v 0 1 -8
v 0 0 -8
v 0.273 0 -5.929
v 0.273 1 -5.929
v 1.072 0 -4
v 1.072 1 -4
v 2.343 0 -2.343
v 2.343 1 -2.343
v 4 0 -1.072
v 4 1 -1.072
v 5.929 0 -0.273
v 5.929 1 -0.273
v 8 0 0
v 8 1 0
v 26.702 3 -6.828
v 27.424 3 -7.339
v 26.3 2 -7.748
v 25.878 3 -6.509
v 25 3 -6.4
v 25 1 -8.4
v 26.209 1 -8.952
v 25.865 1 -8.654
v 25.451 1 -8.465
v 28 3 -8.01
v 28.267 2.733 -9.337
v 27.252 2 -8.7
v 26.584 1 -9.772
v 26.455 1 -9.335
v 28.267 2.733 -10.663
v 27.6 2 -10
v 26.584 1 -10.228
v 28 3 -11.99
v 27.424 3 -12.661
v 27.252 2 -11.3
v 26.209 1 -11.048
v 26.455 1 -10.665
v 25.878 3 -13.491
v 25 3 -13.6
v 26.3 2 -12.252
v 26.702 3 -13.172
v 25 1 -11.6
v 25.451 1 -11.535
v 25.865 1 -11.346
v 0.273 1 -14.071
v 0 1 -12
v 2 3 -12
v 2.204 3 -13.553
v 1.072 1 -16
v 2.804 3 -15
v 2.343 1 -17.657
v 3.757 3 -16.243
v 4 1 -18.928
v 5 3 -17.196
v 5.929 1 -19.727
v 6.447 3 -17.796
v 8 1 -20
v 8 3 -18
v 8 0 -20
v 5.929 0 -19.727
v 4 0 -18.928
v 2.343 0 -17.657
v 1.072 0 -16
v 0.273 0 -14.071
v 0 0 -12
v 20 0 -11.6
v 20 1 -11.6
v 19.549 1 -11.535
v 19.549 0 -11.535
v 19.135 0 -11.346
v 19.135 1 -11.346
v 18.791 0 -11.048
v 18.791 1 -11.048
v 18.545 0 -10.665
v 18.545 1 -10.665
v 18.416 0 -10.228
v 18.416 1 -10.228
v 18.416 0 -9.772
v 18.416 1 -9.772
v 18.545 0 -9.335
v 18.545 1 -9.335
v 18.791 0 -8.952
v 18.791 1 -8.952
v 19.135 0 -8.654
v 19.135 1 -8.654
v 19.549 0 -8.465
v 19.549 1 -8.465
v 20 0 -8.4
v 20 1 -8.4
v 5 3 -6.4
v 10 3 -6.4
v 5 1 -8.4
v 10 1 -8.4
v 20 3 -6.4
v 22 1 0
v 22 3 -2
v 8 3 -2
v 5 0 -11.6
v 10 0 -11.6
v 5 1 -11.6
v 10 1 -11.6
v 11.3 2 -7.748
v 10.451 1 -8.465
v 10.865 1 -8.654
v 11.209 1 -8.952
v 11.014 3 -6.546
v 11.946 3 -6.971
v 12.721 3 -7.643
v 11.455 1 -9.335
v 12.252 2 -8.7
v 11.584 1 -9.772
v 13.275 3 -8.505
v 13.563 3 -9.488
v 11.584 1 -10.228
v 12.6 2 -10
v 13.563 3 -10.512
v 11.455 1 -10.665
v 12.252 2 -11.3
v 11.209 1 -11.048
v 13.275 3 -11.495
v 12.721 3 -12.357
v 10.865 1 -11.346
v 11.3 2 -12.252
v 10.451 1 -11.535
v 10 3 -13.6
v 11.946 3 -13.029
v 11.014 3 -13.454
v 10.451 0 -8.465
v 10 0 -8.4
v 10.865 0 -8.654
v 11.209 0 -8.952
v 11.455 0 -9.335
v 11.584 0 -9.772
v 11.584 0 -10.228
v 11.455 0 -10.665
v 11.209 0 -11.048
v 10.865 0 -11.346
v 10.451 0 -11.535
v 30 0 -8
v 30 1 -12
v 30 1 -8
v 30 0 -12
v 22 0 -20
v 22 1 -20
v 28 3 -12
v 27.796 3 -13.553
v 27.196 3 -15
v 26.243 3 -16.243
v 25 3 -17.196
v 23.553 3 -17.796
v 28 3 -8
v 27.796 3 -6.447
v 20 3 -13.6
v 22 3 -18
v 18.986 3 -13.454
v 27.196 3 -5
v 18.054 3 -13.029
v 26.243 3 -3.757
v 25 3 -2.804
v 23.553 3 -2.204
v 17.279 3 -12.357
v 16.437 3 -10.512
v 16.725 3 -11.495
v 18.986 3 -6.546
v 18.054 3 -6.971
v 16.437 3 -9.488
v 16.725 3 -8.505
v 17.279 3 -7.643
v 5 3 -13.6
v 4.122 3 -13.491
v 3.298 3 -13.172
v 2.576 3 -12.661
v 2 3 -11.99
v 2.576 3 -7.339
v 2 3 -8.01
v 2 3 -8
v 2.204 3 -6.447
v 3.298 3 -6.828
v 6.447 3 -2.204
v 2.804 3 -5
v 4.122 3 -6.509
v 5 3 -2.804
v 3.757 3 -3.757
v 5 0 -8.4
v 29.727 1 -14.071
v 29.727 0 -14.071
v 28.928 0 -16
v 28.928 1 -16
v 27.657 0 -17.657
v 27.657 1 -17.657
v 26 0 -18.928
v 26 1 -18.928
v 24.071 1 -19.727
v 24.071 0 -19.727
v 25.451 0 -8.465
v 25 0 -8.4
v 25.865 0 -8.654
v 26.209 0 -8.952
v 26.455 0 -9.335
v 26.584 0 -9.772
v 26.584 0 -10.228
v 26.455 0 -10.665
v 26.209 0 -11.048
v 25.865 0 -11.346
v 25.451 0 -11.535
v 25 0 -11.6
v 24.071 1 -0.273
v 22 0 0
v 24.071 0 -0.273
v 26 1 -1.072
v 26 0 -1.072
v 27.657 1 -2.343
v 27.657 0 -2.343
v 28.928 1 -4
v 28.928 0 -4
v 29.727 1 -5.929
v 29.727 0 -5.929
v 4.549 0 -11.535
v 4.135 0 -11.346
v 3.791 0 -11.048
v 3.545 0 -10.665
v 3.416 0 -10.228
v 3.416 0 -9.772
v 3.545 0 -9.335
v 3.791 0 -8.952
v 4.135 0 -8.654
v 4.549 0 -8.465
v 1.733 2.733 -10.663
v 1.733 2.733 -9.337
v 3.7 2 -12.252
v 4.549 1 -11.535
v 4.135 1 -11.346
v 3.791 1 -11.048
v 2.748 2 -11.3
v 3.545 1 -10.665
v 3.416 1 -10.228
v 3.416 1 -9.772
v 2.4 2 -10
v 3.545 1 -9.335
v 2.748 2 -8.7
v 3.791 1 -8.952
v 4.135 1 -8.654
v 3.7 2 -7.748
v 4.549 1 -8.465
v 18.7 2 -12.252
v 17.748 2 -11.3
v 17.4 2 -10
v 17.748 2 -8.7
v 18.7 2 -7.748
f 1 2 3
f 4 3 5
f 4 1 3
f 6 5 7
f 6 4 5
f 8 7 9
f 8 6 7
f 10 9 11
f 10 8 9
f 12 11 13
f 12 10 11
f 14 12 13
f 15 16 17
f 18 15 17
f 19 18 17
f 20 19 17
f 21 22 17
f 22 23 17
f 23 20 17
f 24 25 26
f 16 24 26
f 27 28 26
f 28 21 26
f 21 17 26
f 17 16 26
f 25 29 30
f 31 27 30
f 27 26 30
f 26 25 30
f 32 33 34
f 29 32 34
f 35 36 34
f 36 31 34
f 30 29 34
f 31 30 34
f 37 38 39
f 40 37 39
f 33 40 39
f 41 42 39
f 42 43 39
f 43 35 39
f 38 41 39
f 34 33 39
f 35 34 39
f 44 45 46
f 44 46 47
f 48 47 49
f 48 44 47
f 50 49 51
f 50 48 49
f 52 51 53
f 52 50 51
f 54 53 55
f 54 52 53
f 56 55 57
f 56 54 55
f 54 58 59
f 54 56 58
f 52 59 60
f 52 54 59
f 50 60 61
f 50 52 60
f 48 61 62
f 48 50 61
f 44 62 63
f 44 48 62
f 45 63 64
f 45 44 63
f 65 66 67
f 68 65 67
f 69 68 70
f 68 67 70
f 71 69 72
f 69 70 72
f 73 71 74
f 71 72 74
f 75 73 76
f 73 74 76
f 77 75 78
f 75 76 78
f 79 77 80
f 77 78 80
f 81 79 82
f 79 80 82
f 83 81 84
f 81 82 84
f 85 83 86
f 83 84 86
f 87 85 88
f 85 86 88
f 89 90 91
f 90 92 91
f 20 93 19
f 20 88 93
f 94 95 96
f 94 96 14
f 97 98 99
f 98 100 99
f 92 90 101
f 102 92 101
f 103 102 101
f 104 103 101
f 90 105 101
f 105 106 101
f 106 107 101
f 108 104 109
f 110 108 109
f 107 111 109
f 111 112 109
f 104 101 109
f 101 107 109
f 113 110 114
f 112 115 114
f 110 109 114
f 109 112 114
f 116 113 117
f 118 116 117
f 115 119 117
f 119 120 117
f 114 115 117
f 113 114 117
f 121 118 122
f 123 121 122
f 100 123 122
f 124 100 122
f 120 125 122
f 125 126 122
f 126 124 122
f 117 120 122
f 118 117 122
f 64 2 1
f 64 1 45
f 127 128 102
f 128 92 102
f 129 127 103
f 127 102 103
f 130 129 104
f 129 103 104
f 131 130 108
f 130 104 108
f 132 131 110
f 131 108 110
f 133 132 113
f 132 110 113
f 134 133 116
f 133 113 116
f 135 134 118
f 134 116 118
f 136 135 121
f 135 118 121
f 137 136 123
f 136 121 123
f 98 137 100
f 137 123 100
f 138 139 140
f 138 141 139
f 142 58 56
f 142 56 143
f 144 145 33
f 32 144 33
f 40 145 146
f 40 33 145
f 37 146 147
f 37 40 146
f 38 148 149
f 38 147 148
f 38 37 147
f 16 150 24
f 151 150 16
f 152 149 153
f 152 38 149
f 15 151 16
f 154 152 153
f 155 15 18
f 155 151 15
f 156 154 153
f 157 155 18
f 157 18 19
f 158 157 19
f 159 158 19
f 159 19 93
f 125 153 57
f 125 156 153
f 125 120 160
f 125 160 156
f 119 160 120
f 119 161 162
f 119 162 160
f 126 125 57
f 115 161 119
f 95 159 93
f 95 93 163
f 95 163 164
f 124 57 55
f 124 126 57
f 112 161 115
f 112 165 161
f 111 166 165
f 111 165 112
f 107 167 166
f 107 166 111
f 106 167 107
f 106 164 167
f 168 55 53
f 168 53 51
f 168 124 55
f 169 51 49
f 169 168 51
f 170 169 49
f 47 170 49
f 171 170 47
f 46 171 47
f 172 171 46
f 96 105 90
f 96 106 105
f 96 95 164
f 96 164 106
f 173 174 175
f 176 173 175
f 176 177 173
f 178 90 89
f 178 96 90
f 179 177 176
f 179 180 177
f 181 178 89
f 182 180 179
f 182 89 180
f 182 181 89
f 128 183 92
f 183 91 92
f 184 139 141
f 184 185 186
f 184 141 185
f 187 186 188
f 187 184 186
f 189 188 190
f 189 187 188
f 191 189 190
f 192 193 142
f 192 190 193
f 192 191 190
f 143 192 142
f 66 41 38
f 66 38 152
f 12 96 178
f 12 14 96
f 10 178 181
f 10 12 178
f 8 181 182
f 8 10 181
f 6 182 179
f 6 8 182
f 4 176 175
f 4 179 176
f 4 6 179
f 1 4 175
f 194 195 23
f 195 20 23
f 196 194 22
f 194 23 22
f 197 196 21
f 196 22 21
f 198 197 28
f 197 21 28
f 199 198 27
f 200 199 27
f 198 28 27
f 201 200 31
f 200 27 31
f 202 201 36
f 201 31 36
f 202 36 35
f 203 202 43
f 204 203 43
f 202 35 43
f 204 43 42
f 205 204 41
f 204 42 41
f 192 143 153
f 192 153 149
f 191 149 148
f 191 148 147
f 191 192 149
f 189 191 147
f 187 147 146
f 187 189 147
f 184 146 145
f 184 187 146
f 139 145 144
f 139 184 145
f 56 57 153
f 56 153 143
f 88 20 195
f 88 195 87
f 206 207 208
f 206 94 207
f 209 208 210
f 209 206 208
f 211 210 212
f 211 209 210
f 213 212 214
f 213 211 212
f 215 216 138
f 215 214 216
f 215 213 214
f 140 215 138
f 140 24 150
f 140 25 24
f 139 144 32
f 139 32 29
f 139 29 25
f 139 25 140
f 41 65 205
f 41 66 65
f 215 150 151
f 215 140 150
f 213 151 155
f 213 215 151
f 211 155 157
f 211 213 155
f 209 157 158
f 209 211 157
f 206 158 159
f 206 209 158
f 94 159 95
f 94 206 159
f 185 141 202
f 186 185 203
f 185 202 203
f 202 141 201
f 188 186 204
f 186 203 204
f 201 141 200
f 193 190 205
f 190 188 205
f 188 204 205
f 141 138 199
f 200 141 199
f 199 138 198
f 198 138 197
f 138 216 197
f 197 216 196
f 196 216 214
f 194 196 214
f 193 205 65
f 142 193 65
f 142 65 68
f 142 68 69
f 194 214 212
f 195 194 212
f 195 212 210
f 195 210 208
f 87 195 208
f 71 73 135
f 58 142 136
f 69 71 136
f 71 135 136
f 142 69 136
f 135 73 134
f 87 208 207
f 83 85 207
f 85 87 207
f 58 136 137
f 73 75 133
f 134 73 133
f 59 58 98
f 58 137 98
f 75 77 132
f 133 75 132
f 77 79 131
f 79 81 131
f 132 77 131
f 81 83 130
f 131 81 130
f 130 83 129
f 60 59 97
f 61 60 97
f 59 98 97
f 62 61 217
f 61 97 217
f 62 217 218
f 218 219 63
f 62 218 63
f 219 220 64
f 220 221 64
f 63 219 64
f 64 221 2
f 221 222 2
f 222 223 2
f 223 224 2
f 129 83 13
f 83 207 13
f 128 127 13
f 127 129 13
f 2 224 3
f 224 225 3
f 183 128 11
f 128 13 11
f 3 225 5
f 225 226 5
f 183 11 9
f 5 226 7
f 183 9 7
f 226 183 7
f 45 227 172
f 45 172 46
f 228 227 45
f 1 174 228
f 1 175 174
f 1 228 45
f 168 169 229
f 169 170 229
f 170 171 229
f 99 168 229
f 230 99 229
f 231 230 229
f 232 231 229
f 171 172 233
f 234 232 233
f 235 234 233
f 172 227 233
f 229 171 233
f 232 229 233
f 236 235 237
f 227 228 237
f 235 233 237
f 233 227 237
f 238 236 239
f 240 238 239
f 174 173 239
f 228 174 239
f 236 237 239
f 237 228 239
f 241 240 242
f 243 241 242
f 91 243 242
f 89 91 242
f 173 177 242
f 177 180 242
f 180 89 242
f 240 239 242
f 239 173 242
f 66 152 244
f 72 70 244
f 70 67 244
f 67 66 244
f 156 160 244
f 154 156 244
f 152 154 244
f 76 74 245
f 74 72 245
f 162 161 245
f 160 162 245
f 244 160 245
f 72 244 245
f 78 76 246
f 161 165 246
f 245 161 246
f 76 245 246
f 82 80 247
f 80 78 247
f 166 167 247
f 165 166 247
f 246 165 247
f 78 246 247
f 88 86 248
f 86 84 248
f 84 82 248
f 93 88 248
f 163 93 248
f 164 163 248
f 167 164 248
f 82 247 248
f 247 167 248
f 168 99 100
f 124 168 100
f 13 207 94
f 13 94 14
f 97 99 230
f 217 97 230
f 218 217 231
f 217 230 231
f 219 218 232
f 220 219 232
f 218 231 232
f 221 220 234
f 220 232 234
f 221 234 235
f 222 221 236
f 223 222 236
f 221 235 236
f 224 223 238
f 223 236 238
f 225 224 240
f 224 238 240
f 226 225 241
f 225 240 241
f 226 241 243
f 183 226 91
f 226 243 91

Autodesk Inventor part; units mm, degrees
ref_plane "YZ Plane" through (0, 0, 0) normal (1, 0, 0) x (0, 1, 0)
ref_plane "XZ Plane" through (0, 0, 0) normal (0, 1, 0) x (-1, 0, 0)
ref_plane "XY Plane" through (0, 0, 0) normal (0, 0, 1) x (1, 0, 0)
sketch "Sketch1" plane through (0, 0, 0) normal (0, 1, 0) x (-1, 0, 0)
  line L0 (0, -20) -> (-30, -20)
  line L1 (-30, -20) -> (-30, 0)
  line L2 (-30, 0) -> (0, 0)
  line L3 (0, 0) -> (0, -20)
  dimension "d0" = 20
  dimension "d1" = 30
extrude "Extrusion1" add sketch "Sketch1" along normal blind 3
sketch "Sketch10" plane through (0, 3, 0) normal (0, 1, 0) x (1, 0, 0)
  circle A0 centre (5, 10) radius 1.6
  circle A1 centre (25, 10) radius 1.6
  line L0 (30, 20) -> (0, 20) projected
  line L1 (0, 0) -> (30, 0) projected
  line L2 (0, 20) -> (0, 0) projected
  line L3 (30, 0) -> (30, 20) projected
  line L4 (5, 10) -> (10, 10) construction
  line L5 (5, 8.4) -> (10, 8.4)
  line L6 (10, 11.6) -> (5, 11.6)
  arc A2 (5, 11.6) -> (5, 8.4) centre (5, 10) ccw
  arc A3 (10, 8.4) -> (10, 11.6) centre (10, 10) ccw
  line L7 (25, 10) -> (20, 10) construction
  line L8 (25, 8.4) -> (20, 8.4)
  line L9 (20, 11.6) -> (25, 11.6)
  arc A4 (25, 8.4) -> (25, 11.6) centre (25, 10) ccw
  arc A5 (20, 11.6) -> (20, 8.4) centre (20, 10) ccw
  point P0 (7.5, 10)
  point P1 (22.5, 10)
  dimension "d66" = 3.2
  dimension "d64" = 20
  dimension "d65" = 10
  dimension "d67" = 5
  dimension "d68" = 20
  dimension "d69" = 5
  dimension "d79" = 5
  dimension "d80" = 5
extrude "Extrusion6" cut sketch "Sketch10" against normal through all contours A0 | A0 L6 A3 L5 | A1 | A1 L8 A5 L9
fillet "Fillet5" radius 8 4 edges at (0, 1.5, 0) (0, 1.5, -20) (30, 1.5, -20) (30, 1.5, 0)
chamfer "Chamfer5" distance 2 angle 45 2 edges at (3.4, 3, -10) (26.6, 3, -10)
chamfer "Chamfer6" distance 2 angle 45 8 edges at (15, 3, 0) (27.6569, 3, -2.3431) (30, 3, -10) (27.6569, 3, -17.6569) (15, 3, -20) (2.3431, 3, -17.6569) (0, 3, -10) (2.3431, 3, -2.3431)
equation "\"d65\" = 0.5 * d64"
properties part number "synth-straight-bracket"
